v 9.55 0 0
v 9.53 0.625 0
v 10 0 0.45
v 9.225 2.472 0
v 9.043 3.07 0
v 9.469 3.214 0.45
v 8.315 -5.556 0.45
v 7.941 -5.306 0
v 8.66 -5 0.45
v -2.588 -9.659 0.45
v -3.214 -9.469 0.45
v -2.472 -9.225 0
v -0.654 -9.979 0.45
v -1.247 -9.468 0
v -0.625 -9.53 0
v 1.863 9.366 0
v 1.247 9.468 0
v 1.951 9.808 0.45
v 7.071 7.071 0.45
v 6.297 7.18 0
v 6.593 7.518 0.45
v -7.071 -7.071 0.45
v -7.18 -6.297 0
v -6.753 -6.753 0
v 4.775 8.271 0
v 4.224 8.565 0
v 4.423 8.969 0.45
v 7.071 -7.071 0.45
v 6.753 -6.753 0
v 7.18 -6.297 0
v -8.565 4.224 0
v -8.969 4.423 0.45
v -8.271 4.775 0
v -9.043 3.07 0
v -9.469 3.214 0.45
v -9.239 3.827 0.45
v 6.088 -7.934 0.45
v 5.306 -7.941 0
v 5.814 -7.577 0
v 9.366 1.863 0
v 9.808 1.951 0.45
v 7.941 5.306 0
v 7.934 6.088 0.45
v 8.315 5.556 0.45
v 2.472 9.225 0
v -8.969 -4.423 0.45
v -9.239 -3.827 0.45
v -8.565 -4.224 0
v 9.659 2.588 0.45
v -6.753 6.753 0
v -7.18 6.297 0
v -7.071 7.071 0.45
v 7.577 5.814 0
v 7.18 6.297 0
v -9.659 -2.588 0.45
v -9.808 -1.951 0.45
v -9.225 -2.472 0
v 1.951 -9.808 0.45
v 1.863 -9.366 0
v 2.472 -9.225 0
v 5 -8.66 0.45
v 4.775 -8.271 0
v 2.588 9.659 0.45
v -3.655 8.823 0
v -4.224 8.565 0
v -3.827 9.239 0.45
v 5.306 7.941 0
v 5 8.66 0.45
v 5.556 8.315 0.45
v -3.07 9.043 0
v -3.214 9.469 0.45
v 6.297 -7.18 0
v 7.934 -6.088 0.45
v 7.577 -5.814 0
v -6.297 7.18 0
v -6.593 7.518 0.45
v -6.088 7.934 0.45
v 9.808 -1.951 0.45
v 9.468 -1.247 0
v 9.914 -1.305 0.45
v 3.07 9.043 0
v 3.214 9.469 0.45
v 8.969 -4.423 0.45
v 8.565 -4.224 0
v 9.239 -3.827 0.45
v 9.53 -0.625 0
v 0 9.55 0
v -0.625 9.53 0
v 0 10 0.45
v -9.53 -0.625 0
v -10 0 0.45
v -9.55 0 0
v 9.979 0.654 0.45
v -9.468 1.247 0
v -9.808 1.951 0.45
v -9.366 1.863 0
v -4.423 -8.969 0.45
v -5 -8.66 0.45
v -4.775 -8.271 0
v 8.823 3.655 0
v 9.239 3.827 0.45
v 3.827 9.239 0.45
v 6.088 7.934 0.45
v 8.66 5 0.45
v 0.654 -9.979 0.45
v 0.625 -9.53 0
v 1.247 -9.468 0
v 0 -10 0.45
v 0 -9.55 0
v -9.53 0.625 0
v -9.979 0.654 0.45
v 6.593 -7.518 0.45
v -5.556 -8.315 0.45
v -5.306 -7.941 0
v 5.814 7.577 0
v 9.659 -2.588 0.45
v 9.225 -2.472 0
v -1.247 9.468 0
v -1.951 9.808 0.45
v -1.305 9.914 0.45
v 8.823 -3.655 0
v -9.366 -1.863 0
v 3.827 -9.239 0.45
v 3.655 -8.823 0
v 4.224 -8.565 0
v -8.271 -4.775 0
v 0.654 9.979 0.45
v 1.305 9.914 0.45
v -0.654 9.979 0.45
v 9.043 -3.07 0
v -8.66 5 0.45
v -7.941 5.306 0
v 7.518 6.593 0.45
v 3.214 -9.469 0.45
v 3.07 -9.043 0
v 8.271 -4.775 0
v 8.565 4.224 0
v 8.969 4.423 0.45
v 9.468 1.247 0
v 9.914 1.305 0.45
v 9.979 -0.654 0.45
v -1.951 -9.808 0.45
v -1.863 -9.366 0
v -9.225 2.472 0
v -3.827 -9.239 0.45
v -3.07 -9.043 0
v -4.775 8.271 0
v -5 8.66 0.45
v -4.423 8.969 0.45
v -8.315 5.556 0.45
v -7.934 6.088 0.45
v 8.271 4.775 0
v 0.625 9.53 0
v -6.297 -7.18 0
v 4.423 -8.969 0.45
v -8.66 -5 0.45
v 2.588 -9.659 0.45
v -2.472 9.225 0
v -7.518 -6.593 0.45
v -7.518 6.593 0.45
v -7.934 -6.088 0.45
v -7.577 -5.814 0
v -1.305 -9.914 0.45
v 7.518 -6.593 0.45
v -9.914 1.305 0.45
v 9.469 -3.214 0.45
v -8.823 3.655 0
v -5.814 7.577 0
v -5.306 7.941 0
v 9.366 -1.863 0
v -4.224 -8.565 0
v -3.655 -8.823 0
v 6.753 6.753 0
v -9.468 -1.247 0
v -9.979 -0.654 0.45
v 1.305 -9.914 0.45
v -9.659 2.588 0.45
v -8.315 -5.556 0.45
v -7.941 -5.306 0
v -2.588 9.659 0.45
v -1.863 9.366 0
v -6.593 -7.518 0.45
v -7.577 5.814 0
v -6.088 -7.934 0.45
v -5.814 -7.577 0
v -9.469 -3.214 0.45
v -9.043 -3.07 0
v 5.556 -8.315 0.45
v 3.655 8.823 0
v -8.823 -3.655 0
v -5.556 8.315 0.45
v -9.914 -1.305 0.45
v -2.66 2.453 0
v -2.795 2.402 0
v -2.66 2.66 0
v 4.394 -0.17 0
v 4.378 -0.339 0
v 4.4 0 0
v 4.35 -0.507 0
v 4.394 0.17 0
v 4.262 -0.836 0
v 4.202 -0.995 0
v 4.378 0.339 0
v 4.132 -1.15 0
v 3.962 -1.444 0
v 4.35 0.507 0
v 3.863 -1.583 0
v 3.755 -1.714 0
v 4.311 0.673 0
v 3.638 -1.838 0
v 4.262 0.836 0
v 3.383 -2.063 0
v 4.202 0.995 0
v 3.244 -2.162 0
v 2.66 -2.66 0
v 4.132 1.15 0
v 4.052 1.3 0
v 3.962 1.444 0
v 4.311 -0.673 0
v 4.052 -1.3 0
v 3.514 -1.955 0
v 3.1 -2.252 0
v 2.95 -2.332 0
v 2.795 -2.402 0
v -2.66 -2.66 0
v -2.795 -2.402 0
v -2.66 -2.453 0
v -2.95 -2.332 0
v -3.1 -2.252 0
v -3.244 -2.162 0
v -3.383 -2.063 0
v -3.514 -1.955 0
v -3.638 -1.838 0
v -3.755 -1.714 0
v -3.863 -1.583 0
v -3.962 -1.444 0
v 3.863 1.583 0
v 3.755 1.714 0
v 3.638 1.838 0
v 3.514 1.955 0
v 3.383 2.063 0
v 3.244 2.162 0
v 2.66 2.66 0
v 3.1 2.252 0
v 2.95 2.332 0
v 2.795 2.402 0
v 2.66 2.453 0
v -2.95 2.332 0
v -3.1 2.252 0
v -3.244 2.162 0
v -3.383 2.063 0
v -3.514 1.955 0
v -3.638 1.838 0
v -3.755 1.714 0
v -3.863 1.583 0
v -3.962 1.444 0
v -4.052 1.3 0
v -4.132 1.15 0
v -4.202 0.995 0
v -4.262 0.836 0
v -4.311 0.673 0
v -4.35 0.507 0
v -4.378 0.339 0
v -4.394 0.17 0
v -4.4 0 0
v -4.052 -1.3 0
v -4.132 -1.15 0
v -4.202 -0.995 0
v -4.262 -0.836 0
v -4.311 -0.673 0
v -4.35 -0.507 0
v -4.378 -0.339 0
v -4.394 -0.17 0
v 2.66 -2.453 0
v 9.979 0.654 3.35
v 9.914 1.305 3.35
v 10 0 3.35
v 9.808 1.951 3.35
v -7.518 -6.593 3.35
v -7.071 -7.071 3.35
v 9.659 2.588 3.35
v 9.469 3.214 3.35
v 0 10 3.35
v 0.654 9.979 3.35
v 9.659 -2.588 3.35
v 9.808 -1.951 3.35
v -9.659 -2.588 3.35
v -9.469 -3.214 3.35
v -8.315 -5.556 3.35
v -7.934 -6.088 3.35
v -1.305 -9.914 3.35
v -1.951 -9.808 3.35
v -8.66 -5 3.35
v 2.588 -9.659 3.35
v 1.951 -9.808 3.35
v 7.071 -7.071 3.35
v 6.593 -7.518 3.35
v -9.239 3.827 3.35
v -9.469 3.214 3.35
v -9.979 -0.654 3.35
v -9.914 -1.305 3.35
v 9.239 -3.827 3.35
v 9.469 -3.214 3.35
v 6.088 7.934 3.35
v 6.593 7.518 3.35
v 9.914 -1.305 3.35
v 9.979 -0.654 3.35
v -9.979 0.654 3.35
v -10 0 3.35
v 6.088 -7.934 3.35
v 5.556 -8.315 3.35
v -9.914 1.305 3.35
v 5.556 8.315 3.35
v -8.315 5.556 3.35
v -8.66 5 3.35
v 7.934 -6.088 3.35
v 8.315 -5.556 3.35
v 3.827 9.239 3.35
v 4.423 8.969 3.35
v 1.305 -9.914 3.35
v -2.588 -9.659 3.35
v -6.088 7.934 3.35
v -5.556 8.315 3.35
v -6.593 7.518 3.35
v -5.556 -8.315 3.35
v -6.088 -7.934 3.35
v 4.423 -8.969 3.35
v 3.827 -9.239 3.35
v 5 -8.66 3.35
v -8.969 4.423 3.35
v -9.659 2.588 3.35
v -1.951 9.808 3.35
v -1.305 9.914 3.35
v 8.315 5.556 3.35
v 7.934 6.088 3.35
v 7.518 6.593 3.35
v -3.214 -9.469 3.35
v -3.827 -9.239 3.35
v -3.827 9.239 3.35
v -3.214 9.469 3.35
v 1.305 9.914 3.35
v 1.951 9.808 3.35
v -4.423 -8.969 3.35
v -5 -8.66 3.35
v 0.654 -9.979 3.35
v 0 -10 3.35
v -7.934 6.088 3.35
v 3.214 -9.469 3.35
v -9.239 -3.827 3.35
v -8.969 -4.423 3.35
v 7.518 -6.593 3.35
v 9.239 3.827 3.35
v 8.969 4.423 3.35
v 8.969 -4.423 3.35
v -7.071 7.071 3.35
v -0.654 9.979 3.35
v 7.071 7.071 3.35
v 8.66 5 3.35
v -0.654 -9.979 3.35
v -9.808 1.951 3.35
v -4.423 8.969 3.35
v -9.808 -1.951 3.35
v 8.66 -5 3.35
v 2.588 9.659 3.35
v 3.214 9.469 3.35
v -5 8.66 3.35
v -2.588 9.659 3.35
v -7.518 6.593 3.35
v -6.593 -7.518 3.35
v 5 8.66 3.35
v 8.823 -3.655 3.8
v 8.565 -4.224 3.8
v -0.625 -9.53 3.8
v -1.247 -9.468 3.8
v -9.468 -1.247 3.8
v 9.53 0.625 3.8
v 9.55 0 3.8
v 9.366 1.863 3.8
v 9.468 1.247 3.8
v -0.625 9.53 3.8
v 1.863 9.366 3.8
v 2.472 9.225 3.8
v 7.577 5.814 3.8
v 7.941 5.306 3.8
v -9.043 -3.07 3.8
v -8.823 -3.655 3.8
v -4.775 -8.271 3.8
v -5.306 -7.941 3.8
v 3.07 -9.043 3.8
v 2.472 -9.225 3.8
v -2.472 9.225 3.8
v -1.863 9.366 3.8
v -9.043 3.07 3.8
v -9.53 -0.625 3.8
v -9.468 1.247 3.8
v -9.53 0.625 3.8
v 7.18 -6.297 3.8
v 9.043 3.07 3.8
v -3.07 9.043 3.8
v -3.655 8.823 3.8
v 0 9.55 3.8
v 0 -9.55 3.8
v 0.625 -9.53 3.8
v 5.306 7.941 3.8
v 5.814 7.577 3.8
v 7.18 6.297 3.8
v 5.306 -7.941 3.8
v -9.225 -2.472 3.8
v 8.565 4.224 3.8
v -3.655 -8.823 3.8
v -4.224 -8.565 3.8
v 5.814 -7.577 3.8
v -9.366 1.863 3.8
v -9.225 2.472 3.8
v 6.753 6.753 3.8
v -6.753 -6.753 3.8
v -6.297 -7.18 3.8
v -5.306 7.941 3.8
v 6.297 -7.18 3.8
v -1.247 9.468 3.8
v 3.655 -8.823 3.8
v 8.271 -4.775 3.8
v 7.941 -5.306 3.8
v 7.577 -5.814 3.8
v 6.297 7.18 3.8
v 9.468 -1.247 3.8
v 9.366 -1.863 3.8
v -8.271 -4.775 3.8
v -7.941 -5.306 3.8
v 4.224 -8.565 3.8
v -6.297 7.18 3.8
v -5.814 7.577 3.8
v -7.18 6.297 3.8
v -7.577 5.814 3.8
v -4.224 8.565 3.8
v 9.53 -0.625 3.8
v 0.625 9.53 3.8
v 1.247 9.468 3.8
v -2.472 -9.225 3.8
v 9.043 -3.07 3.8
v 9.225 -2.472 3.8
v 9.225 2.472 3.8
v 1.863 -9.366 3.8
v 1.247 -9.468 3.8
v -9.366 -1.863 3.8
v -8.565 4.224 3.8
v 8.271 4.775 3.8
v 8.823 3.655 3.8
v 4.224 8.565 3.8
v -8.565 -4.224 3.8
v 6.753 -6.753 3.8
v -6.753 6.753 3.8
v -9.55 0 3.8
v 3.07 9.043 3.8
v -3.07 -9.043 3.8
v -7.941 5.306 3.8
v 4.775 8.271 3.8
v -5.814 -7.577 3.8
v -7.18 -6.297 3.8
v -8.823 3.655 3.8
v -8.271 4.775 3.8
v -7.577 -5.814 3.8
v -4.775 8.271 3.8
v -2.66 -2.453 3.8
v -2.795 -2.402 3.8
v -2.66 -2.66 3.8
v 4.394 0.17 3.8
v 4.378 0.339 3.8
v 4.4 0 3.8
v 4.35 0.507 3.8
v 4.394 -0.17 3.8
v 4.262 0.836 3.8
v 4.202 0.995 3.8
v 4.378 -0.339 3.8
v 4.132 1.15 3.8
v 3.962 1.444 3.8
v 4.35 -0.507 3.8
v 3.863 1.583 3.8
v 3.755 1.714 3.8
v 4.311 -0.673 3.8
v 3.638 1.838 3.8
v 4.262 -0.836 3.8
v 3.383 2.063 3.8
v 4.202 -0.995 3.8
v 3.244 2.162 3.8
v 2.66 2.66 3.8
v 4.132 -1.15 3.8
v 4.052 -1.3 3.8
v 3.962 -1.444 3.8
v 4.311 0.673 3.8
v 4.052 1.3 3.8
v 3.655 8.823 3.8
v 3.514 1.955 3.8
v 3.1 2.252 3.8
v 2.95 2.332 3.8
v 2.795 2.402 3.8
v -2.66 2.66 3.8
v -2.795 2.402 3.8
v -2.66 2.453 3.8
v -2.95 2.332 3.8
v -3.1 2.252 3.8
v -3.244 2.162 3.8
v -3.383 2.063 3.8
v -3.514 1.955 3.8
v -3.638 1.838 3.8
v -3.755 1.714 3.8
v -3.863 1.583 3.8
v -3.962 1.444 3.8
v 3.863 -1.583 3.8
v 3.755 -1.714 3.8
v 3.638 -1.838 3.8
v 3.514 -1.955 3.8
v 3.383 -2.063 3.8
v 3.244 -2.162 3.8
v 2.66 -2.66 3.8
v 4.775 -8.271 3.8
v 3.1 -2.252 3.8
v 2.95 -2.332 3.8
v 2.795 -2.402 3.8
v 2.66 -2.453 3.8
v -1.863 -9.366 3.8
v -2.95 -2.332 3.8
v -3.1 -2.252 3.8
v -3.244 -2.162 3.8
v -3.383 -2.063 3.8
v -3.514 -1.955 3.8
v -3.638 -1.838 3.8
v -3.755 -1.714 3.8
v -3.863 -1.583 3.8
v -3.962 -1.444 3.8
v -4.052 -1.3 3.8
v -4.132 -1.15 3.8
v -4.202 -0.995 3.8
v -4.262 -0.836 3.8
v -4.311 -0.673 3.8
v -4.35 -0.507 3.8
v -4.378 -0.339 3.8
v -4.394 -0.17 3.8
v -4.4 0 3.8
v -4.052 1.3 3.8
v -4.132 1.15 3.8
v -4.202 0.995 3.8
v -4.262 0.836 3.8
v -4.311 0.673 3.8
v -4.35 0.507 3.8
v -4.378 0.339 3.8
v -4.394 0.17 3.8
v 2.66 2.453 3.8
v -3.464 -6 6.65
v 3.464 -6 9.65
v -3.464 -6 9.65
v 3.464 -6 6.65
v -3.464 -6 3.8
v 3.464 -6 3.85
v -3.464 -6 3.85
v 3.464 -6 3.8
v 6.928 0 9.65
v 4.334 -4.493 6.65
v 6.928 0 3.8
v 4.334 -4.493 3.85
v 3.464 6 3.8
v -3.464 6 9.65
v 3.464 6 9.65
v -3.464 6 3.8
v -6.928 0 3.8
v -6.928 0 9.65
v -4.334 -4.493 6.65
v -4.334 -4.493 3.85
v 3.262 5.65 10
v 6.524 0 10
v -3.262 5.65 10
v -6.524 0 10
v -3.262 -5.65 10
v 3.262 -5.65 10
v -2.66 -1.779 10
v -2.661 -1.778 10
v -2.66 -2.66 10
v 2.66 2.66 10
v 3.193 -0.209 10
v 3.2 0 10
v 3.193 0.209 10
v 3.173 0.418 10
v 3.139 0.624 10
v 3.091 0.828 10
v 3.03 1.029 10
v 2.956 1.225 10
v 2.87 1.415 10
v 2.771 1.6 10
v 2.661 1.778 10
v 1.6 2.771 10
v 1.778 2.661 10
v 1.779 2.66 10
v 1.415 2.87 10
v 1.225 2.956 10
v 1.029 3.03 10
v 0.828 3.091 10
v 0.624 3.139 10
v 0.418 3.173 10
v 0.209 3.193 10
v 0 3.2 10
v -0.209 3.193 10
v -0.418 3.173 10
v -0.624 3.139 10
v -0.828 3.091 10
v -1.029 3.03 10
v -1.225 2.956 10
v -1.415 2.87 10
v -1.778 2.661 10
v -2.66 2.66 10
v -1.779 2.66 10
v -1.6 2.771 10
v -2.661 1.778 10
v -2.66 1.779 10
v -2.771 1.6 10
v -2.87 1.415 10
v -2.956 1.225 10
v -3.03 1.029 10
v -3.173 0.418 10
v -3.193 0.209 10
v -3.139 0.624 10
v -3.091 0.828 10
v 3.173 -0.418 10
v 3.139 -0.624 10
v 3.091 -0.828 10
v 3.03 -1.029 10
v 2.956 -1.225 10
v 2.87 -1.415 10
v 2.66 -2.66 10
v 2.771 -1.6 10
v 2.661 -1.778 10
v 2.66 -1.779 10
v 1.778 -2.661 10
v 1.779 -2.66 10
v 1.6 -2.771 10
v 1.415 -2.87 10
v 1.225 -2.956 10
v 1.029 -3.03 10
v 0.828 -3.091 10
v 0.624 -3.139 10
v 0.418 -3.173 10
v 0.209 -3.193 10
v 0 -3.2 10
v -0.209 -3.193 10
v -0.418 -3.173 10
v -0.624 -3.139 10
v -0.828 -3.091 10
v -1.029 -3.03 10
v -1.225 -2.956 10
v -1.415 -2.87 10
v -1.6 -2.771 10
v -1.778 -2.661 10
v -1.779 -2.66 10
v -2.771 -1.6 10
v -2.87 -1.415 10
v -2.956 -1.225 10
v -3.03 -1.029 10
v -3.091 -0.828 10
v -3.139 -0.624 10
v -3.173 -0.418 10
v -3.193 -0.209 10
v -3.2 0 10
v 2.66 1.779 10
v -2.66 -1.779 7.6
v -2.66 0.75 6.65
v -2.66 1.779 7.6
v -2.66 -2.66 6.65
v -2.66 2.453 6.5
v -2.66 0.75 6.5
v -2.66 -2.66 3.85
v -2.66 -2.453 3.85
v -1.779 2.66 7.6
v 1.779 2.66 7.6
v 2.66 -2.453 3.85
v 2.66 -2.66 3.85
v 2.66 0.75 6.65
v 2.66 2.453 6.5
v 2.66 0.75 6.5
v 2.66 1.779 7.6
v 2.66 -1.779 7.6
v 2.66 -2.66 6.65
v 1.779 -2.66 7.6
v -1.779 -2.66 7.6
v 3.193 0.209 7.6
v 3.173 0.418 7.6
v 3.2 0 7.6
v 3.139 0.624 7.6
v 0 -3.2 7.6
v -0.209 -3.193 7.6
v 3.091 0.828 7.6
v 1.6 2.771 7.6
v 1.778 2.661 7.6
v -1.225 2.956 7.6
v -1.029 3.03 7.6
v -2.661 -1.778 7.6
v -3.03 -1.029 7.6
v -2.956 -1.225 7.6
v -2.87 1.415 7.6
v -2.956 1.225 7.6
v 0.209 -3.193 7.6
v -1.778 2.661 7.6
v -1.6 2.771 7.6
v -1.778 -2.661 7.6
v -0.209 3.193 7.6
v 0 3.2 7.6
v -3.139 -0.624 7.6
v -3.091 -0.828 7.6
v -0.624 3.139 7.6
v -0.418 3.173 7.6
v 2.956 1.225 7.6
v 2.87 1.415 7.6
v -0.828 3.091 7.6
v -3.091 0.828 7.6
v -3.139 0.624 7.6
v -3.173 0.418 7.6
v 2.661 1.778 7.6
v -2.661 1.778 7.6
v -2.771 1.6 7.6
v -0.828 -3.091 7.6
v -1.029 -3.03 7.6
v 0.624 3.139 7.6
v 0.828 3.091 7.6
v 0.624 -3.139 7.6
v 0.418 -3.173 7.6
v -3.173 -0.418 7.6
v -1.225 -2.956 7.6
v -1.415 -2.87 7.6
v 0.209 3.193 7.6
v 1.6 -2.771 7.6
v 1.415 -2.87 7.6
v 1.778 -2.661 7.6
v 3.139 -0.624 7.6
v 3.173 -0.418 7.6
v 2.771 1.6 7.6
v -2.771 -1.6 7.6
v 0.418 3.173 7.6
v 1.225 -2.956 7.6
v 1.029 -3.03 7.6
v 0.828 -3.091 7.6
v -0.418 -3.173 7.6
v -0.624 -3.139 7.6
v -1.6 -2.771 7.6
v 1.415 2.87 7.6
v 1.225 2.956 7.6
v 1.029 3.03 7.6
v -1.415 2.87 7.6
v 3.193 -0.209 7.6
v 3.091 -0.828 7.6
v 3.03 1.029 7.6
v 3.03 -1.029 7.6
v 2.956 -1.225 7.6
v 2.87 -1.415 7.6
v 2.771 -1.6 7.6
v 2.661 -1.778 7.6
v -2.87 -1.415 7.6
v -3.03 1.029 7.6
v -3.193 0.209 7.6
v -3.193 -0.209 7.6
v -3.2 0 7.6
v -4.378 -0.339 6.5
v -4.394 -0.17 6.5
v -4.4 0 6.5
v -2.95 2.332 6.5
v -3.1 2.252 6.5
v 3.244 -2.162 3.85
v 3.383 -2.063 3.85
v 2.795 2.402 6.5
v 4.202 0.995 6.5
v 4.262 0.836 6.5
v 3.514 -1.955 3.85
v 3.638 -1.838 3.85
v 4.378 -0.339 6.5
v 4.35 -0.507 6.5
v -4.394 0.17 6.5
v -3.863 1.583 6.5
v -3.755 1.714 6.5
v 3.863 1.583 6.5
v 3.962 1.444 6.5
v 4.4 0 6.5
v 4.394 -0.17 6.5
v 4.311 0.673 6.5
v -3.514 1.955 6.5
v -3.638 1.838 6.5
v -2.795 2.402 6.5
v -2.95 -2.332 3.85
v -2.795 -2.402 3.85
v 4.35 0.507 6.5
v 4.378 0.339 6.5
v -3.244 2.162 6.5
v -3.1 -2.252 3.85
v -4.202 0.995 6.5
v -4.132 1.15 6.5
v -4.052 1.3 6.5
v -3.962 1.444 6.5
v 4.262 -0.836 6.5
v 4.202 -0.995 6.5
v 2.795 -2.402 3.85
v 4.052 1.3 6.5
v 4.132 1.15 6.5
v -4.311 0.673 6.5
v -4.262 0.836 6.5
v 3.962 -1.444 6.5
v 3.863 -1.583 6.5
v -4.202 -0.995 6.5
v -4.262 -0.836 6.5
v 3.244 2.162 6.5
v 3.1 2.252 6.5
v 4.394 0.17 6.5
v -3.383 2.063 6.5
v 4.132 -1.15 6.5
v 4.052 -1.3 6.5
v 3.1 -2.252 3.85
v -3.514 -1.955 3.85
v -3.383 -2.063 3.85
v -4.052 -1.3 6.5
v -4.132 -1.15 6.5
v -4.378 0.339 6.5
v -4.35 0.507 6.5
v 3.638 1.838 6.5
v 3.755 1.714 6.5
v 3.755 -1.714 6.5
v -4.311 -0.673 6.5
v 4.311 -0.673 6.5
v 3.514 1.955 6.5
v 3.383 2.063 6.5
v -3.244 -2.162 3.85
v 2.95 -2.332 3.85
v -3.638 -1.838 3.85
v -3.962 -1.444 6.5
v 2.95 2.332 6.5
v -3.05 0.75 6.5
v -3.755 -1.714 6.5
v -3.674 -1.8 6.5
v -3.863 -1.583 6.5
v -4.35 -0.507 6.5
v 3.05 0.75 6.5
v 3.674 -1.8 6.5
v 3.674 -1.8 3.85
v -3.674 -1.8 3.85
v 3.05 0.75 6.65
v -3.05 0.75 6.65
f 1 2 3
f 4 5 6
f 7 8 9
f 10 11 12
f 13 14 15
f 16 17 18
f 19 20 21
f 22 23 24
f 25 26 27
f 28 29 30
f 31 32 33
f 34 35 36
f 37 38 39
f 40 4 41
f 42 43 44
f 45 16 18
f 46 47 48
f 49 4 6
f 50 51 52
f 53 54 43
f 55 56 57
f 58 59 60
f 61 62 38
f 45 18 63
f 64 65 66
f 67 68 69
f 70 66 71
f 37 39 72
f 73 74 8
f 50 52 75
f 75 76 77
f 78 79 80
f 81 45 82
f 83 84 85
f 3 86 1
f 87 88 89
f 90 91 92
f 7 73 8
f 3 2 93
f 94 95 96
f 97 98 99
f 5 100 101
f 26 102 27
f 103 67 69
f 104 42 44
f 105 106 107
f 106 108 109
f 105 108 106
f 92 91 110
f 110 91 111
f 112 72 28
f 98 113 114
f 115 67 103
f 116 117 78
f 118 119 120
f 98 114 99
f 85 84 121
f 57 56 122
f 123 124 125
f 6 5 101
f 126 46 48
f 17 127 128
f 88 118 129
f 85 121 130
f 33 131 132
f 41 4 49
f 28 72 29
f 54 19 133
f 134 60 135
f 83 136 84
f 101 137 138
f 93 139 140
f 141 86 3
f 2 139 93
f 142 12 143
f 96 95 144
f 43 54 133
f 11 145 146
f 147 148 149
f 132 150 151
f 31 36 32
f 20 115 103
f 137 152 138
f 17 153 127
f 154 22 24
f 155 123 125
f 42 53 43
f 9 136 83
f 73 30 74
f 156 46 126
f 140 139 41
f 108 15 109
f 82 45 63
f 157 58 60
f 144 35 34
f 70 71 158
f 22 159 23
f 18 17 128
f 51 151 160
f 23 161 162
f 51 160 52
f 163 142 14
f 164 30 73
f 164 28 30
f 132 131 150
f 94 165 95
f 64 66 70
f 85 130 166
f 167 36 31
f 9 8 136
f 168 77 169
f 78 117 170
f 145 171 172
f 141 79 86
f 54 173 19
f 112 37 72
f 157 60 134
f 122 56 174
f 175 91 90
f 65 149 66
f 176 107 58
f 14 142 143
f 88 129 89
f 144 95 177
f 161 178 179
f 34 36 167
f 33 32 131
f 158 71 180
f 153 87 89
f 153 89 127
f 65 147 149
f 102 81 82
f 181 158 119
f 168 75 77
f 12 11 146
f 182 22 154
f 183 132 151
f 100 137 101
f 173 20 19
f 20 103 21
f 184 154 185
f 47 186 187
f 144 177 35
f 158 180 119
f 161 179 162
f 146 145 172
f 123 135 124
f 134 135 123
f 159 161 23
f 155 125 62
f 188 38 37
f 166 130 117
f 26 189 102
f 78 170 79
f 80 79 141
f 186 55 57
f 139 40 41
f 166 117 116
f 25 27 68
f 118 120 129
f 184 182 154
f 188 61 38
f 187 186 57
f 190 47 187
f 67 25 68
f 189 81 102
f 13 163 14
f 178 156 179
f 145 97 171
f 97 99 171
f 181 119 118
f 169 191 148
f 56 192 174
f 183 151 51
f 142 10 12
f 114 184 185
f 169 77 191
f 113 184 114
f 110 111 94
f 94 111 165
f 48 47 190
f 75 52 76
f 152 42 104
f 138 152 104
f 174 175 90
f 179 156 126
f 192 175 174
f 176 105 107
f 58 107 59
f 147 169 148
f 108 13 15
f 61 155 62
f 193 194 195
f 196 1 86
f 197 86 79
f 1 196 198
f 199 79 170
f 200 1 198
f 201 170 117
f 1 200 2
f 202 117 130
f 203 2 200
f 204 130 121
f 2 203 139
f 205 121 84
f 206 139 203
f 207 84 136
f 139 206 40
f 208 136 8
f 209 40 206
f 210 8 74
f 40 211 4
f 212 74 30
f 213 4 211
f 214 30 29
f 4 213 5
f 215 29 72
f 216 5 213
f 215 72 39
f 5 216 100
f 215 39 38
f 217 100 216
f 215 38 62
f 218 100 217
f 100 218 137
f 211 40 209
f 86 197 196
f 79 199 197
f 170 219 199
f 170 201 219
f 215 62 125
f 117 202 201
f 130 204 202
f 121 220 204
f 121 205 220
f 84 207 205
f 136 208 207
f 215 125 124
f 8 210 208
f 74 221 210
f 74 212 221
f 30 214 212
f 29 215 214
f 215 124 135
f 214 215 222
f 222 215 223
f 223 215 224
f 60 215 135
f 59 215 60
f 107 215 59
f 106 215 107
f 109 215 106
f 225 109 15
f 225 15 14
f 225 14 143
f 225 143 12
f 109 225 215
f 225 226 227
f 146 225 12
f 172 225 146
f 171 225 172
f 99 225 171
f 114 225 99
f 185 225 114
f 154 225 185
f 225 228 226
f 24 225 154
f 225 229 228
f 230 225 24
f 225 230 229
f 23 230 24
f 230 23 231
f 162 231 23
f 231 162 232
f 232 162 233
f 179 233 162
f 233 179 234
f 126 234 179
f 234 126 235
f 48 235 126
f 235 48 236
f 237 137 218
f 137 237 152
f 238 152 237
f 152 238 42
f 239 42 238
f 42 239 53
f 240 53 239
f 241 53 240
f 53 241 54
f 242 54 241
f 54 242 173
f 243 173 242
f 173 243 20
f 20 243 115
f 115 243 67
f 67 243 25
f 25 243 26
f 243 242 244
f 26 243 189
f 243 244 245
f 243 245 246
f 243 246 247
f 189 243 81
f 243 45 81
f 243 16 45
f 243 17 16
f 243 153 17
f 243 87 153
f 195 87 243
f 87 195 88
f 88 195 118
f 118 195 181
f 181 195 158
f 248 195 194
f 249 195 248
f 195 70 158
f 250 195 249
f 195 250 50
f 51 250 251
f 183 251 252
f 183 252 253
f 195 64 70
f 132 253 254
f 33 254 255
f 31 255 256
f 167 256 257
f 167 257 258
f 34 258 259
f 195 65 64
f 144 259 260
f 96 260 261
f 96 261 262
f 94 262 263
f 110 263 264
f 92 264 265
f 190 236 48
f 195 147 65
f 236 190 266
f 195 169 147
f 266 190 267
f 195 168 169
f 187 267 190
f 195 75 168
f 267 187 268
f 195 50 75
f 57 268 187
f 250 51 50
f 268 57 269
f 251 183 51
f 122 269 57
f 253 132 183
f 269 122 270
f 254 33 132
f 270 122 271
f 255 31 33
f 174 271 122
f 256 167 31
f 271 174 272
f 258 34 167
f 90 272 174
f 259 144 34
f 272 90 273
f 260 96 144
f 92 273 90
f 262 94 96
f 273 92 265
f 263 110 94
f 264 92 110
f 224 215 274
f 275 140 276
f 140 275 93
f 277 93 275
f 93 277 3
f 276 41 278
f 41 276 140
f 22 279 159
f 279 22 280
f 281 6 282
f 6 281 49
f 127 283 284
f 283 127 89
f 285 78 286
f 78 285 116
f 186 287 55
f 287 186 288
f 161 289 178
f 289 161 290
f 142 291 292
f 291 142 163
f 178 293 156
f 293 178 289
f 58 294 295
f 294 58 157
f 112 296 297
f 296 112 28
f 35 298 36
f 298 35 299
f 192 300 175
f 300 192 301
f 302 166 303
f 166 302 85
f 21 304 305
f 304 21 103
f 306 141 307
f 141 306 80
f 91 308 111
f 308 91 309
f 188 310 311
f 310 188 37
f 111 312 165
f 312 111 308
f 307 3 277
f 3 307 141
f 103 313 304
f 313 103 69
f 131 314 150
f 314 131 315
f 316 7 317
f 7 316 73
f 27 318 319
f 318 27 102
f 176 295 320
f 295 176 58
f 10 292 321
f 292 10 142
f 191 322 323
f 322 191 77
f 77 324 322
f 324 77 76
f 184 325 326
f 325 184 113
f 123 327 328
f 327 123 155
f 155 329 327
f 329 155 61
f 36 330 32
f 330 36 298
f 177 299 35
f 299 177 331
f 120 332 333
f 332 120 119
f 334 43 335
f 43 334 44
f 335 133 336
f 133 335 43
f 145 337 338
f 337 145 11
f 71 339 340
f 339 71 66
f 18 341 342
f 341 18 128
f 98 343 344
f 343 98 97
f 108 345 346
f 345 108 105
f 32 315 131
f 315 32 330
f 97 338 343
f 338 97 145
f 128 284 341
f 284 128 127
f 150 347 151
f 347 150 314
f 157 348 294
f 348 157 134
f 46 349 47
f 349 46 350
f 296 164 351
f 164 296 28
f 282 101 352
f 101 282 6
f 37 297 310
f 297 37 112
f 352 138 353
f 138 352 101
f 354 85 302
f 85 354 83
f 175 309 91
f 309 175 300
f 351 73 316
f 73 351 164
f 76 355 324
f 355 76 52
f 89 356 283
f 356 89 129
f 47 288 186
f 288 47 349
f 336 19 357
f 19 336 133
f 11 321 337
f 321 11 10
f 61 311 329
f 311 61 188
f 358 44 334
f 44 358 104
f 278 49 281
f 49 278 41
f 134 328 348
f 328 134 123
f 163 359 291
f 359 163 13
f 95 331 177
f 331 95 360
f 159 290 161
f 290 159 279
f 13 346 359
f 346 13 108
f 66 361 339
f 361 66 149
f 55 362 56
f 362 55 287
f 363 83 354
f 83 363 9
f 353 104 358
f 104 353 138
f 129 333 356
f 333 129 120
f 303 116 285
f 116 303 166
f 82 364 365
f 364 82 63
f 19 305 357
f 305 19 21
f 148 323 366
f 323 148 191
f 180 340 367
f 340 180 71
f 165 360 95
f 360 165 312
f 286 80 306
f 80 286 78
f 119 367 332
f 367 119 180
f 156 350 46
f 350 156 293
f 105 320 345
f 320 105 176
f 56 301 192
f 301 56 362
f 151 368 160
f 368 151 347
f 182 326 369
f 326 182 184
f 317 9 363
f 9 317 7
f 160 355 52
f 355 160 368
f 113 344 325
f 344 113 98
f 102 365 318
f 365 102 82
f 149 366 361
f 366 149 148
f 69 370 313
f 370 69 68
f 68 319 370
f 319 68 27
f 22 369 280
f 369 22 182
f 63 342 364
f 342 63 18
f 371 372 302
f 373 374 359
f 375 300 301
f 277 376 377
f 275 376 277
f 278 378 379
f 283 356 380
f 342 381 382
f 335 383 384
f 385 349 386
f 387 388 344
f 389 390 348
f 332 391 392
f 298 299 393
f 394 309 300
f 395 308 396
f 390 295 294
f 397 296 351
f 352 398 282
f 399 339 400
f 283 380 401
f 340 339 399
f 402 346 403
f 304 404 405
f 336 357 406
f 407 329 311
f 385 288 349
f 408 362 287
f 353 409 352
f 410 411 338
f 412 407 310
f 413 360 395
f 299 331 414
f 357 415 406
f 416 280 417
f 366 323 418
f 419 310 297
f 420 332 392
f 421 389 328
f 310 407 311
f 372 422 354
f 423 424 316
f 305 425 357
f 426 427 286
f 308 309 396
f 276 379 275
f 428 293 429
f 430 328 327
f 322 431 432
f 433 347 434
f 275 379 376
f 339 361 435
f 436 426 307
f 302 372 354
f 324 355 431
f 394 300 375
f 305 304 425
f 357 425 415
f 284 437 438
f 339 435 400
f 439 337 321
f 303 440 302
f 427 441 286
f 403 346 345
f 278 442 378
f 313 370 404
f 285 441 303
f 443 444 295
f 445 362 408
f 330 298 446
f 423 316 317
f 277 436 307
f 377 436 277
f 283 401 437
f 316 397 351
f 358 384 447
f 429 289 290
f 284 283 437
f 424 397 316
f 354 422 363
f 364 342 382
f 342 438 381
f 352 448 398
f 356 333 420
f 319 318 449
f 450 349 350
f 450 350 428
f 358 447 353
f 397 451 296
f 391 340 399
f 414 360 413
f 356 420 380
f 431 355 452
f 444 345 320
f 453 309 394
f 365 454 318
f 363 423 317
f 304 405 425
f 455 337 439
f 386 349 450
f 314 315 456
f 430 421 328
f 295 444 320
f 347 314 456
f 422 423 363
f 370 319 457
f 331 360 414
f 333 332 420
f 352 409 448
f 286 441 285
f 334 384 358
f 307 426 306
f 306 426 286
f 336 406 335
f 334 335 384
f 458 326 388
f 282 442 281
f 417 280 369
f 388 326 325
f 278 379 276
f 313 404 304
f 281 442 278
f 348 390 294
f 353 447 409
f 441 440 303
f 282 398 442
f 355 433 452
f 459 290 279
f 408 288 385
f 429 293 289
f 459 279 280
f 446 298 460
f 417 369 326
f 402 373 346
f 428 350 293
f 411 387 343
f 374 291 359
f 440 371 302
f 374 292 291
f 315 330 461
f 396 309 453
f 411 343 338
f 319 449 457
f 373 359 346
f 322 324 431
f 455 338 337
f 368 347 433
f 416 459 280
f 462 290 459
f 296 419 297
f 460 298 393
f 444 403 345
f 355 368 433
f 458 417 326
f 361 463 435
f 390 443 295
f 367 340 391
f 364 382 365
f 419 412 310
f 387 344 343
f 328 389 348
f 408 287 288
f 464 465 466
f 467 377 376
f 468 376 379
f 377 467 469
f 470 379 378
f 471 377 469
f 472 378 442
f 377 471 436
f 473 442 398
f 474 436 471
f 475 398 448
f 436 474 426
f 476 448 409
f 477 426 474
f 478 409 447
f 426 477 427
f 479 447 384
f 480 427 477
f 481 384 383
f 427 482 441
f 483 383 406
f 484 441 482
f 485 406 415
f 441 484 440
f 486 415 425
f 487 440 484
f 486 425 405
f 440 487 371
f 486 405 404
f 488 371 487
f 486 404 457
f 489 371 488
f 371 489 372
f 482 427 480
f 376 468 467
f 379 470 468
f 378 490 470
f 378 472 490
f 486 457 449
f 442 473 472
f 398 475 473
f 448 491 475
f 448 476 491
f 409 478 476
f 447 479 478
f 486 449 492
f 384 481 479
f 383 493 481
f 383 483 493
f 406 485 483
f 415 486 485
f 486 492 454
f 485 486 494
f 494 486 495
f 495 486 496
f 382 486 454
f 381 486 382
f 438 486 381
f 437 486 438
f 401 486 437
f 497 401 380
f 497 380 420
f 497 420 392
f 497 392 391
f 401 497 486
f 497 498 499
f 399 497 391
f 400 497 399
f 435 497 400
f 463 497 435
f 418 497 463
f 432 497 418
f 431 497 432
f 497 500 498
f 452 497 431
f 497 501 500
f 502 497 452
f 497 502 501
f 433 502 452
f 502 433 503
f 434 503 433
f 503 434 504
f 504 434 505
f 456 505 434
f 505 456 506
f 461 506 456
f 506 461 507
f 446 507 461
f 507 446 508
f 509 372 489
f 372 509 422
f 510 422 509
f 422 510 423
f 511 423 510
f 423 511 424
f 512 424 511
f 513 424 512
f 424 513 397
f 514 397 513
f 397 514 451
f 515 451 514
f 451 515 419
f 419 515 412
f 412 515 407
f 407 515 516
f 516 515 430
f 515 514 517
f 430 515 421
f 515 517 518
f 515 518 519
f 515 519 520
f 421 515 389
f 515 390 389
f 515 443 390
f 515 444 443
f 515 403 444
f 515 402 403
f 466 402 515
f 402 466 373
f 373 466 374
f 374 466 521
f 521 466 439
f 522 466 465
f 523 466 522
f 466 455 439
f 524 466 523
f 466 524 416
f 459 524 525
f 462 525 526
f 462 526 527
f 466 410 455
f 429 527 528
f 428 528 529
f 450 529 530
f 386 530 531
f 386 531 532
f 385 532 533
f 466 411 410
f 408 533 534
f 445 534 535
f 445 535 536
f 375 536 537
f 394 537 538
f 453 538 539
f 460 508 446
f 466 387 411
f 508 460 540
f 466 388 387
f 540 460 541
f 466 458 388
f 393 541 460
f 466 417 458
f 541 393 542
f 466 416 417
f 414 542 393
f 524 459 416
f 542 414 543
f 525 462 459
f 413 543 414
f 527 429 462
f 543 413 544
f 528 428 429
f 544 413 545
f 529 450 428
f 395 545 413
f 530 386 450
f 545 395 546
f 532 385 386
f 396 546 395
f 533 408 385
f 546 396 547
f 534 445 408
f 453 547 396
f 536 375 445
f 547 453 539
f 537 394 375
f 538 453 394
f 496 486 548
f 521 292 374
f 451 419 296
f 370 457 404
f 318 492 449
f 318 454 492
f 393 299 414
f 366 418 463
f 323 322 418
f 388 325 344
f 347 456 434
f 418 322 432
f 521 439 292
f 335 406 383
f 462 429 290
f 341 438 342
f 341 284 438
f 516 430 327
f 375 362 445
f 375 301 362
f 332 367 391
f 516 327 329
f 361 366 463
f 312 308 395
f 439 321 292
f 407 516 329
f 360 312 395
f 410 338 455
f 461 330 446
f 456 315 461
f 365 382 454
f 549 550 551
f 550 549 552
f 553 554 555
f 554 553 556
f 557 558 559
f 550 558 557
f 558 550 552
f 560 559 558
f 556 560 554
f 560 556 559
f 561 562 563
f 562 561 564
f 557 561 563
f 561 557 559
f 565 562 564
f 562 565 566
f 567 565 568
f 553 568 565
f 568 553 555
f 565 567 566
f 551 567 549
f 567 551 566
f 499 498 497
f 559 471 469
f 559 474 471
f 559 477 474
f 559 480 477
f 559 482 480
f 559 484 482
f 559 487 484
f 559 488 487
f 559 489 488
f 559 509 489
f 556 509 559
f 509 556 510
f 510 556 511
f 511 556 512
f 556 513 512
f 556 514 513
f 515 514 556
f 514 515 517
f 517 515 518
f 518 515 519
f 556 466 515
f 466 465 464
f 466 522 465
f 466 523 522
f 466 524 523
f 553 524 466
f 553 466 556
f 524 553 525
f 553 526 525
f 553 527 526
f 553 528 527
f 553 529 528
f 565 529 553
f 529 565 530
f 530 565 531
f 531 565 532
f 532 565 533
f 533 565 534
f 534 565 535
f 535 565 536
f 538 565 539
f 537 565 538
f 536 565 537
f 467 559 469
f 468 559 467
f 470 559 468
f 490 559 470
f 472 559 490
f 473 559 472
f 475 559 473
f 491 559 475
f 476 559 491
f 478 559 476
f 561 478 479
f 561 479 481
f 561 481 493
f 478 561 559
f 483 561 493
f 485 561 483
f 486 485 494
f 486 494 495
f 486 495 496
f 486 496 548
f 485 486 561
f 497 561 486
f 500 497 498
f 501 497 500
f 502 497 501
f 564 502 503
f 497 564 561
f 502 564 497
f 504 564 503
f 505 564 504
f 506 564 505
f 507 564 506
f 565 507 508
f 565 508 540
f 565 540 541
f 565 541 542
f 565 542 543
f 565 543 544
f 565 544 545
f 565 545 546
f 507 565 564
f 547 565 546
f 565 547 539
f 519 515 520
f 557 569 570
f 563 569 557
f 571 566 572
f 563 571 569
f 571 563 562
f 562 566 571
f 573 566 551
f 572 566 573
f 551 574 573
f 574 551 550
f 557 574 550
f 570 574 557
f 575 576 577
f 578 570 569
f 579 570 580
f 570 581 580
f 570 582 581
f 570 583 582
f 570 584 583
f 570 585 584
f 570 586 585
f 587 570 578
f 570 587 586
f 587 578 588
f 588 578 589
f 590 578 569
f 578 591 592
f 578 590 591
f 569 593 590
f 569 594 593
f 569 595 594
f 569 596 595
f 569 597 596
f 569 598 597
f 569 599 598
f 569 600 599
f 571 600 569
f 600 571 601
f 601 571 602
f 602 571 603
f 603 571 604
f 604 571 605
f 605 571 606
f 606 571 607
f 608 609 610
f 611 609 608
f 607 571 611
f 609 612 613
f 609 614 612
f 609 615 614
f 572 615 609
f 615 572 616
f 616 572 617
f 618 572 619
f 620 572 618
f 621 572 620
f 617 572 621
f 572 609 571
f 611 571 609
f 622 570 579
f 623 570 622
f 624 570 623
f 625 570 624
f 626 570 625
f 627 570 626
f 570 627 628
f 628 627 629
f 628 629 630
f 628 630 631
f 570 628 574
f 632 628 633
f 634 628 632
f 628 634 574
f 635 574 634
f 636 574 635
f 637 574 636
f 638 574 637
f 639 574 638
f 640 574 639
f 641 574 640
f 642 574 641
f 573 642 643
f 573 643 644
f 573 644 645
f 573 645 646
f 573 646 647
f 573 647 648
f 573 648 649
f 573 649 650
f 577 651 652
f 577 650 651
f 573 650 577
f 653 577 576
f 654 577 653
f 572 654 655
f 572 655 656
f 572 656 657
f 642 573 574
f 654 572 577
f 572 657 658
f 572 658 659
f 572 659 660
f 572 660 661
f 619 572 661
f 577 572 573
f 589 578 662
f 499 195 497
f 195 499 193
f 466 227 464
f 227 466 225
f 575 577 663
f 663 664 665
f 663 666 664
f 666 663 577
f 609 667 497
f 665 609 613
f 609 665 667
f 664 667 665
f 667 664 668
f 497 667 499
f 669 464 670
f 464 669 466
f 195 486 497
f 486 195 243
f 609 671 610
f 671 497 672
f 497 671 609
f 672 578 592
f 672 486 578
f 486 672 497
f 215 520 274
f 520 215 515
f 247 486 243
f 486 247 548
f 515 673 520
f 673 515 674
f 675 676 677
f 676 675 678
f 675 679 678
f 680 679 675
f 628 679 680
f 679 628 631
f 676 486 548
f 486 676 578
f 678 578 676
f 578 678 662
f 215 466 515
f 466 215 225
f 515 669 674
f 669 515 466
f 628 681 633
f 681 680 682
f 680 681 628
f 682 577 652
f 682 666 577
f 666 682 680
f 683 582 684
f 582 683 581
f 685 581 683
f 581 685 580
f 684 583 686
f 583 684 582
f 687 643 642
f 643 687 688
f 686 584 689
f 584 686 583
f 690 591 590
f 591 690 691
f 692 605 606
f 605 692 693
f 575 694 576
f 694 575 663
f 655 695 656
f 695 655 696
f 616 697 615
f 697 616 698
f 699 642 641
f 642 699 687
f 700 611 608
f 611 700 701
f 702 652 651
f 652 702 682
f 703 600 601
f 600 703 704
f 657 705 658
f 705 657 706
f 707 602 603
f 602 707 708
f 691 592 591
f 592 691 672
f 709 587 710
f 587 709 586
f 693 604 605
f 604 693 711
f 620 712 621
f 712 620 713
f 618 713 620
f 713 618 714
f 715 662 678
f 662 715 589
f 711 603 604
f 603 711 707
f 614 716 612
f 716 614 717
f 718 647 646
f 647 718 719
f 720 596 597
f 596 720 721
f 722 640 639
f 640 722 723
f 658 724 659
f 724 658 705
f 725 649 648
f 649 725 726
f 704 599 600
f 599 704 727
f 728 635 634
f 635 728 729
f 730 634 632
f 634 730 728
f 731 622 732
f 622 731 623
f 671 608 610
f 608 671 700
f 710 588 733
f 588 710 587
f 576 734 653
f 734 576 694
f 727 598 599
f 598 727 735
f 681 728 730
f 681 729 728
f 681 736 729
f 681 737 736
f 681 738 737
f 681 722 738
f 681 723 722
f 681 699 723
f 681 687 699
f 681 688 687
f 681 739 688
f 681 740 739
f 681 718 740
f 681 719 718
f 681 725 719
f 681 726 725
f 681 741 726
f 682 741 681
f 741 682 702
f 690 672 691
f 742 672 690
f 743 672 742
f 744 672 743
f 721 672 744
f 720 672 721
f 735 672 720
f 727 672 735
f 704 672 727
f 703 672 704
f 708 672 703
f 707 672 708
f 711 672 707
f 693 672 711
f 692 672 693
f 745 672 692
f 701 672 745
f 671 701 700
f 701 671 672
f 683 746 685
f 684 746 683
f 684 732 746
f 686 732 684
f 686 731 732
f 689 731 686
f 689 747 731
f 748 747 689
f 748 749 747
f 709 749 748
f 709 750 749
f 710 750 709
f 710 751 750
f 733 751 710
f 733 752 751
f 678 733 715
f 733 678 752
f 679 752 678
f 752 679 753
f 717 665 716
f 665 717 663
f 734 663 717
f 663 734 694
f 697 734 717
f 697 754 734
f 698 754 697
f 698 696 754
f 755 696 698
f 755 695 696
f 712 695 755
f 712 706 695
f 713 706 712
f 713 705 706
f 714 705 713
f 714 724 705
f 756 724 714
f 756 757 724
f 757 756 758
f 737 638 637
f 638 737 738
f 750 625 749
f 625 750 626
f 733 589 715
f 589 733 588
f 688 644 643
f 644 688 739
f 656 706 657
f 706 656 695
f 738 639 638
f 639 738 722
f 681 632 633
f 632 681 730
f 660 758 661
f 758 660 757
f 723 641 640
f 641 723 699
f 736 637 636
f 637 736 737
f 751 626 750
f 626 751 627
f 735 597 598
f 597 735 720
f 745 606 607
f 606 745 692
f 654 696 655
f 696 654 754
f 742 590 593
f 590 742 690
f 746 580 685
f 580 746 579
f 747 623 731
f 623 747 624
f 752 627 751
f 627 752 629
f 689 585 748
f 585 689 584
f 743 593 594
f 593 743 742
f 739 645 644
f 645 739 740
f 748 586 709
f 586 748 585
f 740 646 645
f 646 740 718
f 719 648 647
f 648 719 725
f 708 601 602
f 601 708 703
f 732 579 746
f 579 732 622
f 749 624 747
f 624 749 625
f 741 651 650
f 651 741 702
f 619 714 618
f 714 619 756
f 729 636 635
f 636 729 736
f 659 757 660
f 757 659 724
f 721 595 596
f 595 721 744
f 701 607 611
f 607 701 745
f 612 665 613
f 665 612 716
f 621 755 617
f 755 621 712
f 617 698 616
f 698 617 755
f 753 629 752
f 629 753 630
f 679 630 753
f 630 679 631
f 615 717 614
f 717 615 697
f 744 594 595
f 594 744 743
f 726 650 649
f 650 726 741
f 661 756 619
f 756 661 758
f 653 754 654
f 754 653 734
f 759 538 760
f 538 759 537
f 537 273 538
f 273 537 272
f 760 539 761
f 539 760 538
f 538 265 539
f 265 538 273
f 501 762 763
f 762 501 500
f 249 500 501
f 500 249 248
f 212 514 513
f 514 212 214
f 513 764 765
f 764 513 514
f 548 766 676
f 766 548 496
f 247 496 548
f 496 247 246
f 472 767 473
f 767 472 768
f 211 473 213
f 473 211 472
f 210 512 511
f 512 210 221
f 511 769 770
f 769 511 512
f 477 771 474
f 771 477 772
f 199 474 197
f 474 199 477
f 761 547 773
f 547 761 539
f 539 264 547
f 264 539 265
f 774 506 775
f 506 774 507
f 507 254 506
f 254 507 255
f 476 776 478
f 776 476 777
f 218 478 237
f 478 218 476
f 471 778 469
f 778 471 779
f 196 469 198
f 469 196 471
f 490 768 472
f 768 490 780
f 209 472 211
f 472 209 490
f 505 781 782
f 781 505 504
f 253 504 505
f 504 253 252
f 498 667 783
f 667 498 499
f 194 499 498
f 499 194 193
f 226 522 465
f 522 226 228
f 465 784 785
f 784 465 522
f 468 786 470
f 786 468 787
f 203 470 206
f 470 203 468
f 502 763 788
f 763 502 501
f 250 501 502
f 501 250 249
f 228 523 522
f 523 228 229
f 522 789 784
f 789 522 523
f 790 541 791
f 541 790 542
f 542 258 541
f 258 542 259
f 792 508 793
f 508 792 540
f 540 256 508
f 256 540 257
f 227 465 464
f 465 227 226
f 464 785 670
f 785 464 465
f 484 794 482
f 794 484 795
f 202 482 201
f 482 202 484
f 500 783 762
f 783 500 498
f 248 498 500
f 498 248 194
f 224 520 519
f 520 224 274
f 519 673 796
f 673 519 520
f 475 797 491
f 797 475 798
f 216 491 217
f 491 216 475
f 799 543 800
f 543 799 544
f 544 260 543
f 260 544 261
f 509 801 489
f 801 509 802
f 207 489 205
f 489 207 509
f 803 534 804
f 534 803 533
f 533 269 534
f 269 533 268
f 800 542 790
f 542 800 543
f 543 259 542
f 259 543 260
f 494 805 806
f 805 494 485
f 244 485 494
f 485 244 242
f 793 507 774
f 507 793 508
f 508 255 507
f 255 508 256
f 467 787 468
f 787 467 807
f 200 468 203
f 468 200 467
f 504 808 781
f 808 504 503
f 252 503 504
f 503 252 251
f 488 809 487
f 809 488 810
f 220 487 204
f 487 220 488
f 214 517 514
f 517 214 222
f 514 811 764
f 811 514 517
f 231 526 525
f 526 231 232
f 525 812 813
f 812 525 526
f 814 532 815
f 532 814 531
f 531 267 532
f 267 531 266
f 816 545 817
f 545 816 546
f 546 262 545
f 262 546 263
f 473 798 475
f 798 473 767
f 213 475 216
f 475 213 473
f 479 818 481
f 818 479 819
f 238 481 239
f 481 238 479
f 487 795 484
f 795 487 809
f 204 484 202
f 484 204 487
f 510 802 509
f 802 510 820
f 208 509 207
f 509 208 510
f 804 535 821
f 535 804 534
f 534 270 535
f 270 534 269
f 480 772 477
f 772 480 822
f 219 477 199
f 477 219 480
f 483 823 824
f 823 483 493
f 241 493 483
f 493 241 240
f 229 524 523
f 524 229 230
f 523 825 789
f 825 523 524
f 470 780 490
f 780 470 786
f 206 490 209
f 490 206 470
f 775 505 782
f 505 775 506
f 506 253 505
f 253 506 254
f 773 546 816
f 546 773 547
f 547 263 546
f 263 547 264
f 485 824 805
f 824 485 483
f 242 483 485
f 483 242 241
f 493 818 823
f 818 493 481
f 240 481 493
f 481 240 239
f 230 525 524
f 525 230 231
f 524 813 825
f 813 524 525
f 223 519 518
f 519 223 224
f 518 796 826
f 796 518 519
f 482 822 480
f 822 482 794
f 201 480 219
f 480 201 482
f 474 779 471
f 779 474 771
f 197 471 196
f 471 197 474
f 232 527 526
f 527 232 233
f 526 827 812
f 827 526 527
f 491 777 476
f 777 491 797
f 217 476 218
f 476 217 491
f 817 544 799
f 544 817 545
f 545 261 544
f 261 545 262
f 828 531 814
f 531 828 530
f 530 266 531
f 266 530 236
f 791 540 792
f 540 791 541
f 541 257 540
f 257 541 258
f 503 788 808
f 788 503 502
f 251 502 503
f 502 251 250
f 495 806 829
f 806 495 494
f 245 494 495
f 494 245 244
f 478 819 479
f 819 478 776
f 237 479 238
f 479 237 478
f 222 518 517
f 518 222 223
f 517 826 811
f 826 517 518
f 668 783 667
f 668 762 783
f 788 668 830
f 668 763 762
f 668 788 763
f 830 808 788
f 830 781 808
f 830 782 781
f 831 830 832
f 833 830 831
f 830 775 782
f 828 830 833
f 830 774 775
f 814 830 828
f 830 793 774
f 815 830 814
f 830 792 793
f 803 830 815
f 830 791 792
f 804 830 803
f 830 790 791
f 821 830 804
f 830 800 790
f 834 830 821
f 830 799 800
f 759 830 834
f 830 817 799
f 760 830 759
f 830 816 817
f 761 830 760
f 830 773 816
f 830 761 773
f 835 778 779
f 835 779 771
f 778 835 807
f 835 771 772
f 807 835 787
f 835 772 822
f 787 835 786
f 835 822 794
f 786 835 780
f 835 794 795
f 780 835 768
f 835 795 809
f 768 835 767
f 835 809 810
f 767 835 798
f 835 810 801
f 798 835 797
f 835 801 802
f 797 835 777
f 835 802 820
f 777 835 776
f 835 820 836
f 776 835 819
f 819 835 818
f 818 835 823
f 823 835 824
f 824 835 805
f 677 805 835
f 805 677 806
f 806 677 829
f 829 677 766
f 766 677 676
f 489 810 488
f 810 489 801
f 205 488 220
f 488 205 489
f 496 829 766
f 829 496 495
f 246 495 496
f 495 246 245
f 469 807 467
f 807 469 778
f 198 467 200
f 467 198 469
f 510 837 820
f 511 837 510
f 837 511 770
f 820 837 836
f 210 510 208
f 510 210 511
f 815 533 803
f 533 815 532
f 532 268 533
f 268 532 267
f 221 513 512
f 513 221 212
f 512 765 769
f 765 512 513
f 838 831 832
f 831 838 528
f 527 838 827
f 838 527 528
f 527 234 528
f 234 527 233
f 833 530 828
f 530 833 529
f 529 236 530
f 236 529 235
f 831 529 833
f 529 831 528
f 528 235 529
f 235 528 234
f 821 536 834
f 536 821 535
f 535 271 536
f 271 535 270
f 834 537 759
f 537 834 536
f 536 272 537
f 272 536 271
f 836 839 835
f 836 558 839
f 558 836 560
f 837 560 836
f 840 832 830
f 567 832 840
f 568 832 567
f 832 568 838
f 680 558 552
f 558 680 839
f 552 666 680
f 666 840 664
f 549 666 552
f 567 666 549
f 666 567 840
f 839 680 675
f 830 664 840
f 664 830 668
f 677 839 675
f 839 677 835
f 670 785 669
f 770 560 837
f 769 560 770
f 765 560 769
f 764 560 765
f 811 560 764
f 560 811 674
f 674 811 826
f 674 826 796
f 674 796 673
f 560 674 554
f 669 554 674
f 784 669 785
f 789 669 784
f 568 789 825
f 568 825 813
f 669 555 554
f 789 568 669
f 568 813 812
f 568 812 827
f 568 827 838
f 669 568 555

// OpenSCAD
$fn = 96;

flange_d = 20.0;
flange_h = 3.8;

boss_af = 12.0;
boss_h = 6.2;

square_broach = 5.3;

top_round_d = 6.4;
top_round_h = 2.4;

bottom_oval_x = 8.8;
bottom_oval_y = 5.2;
bottom_oval_h = 6.5;

cutout_h = 2.8;
cutout_z = flange_h + 1.45;
cutout_inset_from_side_vertex = 1.15;
cutout_back_stop = 0.75;
cutout_front_extra = 0.6;

flange_chamfer = 0.45;
boss_top_chamfer = 0.35;

clearance_extra = 0.02;

total_h = flange_h + boss_h;
boss_r = boss_af / sqrt(3);

module chamfered_cylinder(d, h, c) {
    cylinder(h = c, d1 = d - 2*c, d2 = d);

    translate([0, 0, c])
        cylinder(h = h - 2*c, d = d);

    translate([0, 0, h - c])
        cylinder(h = c, d1 = d, d2 = d - 2*c);
}

module straight_hex_af(af, h, top_c) {
    r_mid = af / sqrt(3);
    r_top = (af - 2*top_c) / sqrt(3);

    cylinder(h = h - top_c, r = r_mid, $fn = 6);

    translate([0, 0, h - top_c])
        cylinder(h = top_c, r1 = r_mid, r2 = r_top, $fn = 6);
}

module square_broach_cut() {
    translate([0, 0, -1])
        linear_extrude(height = total_h + 2)
            square([
                square_broach + clearance_extra,
                square_broach + clearance_extra
            ], center = true);
}

module top_round_cut() {
    translate([0, 0, total_h - top_round_h])
        cylinder(h = top_round_h + 1, d = top_round_d);
}

module bottom_oval_cut() {
    translate([0, 0, -0.1])
        linear_extrude(height = bottom_oval_h + 0.1)
            hull() {
                translate([-bottom_oval_x/2 + bottom_oval_y/2, 0])
                    circle(d = bottom_oval_y);

                translate([ bottom_oval_x/2 - bottom_oval_y/2, 0])
                    circle(d = bottom_oval_y);
            }
}

module wide_hex_side_cutout_cut() {
    y_front = -boss_af / 2 - cutout_front_extra;
    y_back = cutout_back_stop;

    x_side = boss_r * cos(30) - cutout_inset_from_side_vertex;
    x_back = x_side - 1.8;

    translate([0, 0, cutout_z - cutout_h / 2])
        linear_extrude(height = cutout_h)
            polygon(points = [
                [-x_side, y_front],
                [ x_side, y_front],
                [ x_back, y_back],
                [-x_back, y_back]
            ]);
}

module adapter_body() {
    union() {
        chamfered_cylinder(
            d = flange_d,
            h = flange_h,
            c = flange_chamfer
        );

        translate([0, 0, flange_h])
            straight_hex_af(
                af = boss_af,
                h = boss_h,
                top_c = boss_top_chamfer
            );
    }
}

module faucet_handle_adapter() {
    difference() {
        adapter_body();

        square_broach_cut();
        top_round_cut();
        bottom_oval_cut();
        wide_hex_side_cutout_cut();
    }
}

faucet_handle_adapter();
